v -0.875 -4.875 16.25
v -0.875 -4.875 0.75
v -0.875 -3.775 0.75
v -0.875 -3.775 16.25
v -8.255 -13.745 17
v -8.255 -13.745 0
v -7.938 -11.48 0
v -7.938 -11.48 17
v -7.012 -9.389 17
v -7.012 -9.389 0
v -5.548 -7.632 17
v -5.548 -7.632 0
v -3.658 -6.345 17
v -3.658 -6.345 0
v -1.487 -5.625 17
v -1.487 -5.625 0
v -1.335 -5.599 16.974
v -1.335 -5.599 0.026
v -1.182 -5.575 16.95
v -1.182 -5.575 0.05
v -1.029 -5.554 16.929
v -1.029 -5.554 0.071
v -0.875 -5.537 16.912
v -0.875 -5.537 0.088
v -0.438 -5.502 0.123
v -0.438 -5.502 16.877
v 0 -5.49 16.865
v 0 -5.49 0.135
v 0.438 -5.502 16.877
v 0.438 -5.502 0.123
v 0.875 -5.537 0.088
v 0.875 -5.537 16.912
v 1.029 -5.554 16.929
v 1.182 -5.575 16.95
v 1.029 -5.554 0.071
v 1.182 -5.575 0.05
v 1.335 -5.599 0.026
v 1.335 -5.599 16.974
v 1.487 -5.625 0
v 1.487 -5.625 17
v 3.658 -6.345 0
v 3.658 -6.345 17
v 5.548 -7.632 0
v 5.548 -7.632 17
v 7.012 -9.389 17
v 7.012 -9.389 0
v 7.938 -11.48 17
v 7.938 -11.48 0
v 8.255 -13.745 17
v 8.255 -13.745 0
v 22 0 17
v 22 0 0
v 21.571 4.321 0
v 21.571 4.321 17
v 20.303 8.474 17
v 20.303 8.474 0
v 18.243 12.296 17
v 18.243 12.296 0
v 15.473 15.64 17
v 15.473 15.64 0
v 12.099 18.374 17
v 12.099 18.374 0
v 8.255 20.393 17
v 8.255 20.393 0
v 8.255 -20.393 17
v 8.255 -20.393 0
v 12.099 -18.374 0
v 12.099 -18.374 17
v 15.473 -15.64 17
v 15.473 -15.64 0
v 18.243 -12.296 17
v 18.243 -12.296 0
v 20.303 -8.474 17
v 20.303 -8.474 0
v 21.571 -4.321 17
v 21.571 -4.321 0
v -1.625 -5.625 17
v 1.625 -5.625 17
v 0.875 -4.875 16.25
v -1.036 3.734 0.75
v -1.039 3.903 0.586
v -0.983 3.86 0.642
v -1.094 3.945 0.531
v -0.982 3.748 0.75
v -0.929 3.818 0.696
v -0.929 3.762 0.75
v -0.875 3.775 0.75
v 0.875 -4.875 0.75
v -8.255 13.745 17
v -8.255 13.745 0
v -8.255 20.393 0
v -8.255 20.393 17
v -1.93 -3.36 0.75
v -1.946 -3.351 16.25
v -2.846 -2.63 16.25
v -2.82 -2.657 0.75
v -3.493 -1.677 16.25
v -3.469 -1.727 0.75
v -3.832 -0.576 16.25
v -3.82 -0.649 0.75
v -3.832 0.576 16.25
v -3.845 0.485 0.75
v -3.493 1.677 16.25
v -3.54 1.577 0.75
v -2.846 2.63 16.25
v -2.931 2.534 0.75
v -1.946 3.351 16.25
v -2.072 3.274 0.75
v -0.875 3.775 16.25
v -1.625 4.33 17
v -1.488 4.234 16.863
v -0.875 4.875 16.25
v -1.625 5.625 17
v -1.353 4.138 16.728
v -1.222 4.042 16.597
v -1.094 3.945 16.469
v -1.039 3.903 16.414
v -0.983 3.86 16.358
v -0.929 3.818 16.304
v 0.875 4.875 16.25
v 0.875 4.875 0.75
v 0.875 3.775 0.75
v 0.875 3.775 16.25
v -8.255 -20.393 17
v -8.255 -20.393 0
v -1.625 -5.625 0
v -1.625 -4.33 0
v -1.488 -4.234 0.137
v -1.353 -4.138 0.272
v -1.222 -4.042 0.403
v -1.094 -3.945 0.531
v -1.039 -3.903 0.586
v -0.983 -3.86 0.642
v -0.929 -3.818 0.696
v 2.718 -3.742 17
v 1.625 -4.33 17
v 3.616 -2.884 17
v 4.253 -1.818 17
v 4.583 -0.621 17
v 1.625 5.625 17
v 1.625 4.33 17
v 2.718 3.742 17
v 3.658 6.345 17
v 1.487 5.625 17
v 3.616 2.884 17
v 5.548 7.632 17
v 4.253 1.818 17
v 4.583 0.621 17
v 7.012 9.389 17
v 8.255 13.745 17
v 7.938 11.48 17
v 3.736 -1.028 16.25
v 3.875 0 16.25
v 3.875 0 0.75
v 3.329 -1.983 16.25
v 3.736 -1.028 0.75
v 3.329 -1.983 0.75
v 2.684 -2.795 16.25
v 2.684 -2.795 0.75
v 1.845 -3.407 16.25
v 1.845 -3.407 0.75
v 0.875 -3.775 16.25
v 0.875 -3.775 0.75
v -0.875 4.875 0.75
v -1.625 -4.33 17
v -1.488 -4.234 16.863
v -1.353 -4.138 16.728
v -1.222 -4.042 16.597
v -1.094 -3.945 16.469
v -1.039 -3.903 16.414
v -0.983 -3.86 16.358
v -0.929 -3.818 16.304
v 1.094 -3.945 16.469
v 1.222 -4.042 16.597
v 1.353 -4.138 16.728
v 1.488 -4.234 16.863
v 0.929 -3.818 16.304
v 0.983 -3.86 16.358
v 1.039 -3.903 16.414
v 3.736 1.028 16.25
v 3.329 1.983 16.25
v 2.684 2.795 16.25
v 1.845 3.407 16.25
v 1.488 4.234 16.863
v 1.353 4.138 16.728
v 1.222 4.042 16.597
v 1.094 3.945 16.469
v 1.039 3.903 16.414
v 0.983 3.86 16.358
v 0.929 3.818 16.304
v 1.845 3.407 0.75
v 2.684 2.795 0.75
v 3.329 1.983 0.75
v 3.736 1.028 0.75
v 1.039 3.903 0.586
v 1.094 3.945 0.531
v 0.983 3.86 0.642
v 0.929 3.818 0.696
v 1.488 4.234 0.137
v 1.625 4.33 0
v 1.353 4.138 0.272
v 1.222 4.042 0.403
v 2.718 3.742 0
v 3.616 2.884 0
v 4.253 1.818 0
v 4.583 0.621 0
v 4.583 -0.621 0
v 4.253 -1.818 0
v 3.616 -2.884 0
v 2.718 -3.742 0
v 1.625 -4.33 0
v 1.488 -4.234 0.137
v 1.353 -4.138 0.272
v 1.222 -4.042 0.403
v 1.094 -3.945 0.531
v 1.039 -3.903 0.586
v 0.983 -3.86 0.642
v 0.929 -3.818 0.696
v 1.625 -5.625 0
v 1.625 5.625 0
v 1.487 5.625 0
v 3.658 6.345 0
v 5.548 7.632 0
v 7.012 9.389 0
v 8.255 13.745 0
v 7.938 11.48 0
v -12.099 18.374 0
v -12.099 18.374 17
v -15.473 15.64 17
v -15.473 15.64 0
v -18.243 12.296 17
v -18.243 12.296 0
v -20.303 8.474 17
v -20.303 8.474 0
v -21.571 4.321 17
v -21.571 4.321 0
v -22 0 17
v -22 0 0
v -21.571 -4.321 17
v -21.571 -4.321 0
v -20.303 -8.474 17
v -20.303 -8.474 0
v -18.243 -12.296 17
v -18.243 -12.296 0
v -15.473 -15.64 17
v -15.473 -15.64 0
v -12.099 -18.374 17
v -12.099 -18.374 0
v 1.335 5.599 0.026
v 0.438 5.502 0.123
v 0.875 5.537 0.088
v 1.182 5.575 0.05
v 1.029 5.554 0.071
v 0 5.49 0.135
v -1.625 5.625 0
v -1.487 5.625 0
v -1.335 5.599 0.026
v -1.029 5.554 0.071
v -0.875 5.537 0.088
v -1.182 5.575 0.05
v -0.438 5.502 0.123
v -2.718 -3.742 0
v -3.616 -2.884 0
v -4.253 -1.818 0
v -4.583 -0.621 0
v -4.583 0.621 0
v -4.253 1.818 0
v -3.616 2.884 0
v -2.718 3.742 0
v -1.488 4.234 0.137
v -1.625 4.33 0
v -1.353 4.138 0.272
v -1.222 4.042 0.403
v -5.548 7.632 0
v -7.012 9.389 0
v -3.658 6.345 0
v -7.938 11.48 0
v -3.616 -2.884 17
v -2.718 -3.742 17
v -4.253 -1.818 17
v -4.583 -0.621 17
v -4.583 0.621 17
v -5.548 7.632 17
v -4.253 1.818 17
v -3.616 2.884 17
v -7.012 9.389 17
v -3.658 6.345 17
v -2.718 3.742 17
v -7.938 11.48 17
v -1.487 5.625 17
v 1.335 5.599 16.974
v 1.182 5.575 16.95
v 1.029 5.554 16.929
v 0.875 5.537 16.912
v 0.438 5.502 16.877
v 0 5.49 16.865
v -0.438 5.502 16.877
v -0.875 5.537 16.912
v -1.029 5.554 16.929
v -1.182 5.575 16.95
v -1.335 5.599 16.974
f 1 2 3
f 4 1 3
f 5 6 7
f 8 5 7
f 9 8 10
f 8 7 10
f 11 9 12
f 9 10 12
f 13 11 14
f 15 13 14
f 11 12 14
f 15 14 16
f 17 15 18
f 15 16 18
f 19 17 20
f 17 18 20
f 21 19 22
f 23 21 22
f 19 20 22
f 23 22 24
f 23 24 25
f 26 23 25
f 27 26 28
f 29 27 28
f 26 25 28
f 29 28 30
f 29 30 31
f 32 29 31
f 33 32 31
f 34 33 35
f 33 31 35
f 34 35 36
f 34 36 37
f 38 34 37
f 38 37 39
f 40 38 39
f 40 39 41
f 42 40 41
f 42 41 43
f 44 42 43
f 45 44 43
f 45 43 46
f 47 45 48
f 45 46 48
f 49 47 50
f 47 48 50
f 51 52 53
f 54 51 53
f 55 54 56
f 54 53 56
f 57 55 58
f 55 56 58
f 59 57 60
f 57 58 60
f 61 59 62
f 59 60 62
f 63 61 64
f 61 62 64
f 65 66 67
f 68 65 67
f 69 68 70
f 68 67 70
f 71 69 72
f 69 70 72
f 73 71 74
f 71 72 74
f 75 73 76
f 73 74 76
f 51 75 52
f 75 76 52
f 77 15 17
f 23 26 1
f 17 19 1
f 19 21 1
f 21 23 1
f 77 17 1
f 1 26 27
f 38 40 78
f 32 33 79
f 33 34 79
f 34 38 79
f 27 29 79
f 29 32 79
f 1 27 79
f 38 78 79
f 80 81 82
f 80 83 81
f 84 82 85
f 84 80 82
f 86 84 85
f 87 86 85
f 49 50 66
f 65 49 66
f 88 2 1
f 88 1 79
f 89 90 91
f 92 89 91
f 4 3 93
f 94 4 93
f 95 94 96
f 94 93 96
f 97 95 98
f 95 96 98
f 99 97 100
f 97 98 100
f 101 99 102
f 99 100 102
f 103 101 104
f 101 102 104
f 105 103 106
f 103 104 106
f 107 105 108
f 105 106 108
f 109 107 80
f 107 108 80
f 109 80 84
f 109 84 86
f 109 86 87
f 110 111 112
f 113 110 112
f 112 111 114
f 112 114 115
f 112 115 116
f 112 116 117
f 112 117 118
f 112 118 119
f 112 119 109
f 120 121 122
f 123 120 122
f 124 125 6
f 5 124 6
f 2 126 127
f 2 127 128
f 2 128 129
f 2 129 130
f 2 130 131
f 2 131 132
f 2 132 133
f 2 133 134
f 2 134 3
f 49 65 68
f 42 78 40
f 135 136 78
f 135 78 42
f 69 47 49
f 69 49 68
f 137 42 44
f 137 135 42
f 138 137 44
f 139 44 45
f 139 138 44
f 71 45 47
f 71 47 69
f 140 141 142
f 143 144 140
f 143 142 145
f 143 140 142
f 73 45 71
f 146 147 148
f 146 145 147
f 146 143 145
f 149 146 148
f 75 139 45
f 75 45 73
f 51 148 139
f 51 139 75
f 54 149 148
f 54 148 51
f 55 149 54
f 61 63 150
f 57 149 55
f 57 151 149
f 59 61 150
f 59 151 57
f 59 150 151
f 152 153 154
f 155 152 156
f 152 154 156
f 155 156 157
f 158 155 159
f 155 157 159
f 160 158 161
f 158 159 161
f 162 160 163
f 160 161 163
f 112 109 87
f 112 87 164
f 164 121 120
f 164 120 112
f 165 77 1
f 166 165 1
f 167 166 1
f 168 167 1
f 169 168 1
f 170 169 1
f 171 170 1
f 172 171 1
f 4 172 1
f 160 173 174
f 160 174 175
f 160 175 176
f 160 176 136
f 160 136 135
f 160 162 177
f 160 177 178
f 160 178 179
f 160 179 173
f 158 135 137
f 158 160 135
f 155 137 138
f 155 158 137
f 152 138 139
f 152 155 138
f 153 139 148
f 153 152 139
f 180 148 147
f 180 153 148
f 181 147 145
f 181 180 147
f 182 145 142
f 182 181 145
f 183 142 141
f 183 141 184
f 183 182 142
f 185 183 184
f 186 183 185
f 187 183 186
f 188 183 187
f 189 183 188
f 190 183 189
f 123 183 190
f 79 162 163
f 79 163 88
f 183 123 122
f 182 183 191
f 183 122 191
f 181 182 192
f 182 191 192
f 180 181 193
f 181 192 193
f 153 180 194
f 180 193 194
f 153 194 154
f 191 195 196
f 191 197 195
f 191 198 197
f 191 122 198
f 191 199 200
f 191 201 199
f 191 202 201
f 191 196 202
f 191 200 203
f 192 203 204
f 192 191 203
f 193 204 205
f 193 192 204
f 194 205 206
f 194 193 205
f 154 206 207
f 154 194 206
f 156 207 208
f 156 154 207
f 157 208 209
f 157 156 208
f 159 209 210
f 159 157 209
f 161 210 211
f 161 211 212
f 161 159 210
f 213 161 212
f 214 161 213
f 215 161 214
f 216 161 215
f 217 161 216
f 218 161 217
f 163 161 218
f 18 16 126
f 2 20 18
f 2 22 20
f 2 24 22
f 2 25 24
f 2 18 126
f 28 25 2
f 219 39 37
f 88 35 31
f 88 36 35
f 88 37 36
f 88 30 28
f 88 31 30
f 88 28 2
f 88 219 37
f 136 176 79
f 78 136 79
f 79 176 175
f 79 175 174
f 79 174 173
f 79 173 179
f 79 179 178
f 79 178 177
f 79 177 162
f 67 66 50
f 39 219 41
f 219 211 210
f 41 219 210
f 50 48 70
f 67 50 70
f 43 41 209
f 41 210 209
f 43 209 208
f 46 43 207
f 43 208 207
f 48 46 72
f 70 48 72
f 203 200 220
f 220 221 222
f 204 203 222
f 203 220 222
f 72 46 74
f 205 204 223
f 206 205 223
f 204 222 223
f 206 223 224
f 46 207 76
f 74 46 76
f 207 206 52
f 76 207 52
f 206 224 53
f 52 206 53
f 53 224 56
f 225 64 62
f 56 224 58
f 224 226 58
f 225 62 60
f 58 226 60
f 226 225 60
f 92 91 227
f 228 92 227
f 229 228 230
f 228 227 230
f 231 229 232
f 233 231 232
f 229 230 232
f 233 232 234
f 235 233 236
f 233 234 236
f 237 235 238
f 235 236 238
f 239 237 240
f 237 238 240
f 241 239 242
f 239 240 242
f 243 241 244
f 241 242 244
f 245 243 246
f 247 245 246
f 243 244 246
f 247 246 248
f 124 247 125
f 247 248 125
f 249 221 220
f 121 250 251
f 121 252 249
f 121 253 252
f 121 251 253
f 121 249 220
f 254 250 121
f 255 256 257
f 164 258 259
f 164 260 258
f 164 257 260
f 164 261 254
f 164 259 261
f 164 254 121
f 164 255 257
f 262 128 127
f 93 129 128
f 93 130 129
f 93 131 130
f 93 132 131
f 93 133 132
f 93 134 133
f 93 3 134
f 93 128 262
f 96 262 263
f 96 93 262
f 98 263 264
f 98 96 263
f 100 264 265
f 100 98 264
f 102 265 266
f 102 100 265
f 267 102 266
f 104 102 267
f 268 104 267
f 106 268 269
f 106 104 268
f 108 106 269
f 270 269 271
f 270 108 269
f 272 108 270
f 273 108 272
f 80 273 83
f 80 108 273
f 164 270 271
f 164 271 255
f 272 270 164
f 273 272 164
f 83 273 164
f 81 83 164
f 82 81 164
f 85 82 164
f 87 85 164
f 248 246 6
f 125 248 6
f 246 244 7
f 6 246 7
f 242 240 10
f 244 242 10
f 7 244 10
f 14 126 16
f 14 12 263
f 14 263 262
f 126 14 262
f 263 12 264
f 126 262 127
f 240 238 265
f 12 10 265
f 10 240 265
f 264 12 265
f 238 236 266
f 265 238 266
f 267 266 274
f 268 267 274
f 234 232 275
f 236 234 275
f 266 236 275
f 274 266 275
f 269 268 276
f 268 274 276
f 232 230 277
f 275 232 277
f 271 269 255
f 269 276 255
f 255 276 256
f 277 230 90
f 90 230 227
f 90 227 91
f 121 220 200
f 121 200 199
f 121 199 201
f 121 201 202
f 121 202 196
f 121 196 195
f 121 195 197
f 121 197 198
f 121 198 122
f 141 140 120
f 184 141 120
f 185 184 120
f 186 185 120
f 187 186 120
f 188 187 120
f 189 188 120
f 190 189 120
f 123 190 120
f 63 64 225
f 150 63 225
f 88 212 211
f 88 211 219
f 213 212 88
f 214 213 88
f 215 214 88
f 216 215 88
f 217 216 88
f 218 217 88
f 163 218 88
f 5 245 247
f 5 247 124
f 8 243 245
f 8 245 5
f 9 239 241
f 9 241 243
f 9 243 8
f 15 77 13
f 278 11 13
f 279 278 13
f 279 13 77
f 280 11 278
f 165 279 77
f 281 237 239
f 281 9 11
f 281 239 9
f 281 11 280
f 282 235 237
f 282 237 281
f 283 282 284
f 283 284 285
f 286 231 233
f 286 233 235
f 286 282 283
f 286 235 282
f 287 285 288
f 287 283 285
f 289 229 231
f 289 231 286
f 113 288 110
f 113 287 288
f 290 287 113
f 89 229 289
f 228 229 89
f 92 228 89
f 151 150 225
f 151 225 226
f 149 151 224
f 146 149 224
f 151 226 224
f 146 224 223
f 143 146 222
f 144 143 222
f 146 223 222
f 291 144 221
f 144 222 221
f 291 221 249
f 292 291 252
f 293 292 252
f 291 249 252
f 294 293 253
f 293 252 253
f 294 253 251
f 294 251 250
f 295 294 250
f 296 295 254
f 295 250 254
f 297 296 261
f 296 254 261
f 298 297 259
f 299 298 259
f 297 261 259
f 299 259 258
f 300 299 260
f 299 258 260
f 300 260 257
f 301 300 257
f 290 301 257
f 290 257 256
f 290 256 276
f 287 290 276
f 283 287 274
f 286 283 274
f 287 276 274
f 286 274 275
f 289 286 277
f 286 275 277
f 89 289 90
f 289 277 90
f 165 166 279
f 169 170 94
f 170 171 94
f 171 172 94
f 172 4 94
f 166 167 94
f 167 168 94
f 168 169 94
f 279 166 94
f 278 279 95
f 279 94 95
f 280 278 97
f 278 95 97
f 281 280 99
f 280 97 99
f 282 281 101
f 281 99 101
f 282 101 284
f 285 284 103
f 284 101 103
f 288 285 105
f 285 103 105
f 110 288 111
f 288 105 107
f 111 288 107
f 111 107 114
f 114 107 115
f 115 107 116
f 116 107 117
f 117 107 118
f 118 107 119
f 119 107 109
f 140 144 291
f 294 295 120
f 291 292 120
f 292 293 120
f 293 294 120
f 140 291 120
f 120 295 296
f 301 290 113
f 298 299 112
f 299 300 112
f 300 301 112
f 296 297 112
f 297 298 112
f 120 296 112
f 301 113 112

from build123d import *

# Parameters (mm, degrees)
BOSS_EXTRUDE1_DEPTH = 17
CHAMFER1_SIZE       = 0.75
CHAMFER2_SIZE       = 0.75


with BuildPart() as part:
    # Sketch1 → Boss-Extrude1 (new body)
    # profile 1 of 3: a face of its own
    with BuildSketch(Plane.XY):
        with BuildLine():
            Line((-8.255, 13.745), (-8.255, 20.392522527))
            ThreePointArc((-8.255, 20.392522527), (-22, 0), (-8.255, -20.392522527))
            Line((-8.255, -20.392522527), (-8.255, -13.745000015))
            Line((-8.255, -13.745000015), (-8.255, 13.745))
        make_face()
    # profile 2 of 3: a face of its own
    with BuildSketch(Plane.XY):
        with BuildLine():
            ThreePointArc((22, 0), (18.242943841, 12.296137605), (8.255, 20.392522527))
            Line((8.255, 20.392522527), (8.255, 13.745))
            Line((8.255, 13.745), (8.255, -13.745))
            Line((8.255, -13.745), (8.255, -20.392522527))
            ThreePointArc((8.255, -20.392522527), (18.242943841, -12.296137605), (22, 0))
        make_face()
    # profile 3 of 3: a face of its own
    with BuildSketch(Plane.XY):
        with BuildLine():
            ThreePointArc((8.255, 13.745), (0, 5.49), (-8.255, 13.745))
            Line((-8.255, 13.745), (-8.255, -13.745000015))
            ThreePointArc((-8.255, -13.745000015), (-7e-09, -5.49), (8.255, -13.745))
            Line((8.255, -13.745), (8.255, 13.745))
        make_face()
        with BuildLine():
            Line((-0.875, 3.774917218), (-0.875, 4.875))
            Line((-0.875, 4.875), (0.875, 4.875))
            Line((0.875, 4.875), (0.875, 3.774917218))
            ThreePointArc((0.875, 3.774917218), (3.033665275, 2.41091269), (3.875, 0))
            ThreePointArc((3.875, 0), (3.033665275, -2.41091269), (0.875, -3.774917218))
            Line((0.875, -3.774917218), (0.875, -4.875))
            Line((0.875, -4.875), (-0.875, -4.875))
            Line((-0.875, -4.875), (-0.875, -3.774917218))
            ThreePointArc((-0.875, -3.774917218), (-3.875, 0), (-0.875, 3.774917218))
        make_face(mode=Mode.SUBTRACT)
    extrude(amount=BOSS_EXTRUDE1_DEPTH)

    # Chamfer1
    # the kernel refuses this chamfer: 0.75 mm, written as the material it takes off along each edge
    with BuildSketch(Plane(origin=(-0.875, -4.875, 0), x_dir=(-1, 0, 0), z_dir=(0, 1, 0)), Plane(origin=(0.875, -1.846154977, 0), x_dir=(1, 0, 0), z_dir=(0, -1, 0)), Plane(origin=(0.875, 4.875, 0), x_dir=(1, 0, 0), z_dir=(0, -1, 0)), Plane(origin=(-0.875, 1.846154977, 0), x_dir=(-1, 0, 0), z_dir=(0, 1, 0))) as chamfer1_piece_1:
        Polygon((CHAMFER1_SIZE, 0), (0, CHAMFER1_SIZE), (0, 0), align=None)
    extrude(amount=3.028845023, mode=Mode.SUBTRACT)
    with BuildSketch(Plane(origin=(0.875, -4.875, 0), x_dir=(0, -1, 0), z_dir=(-1, 0, 0)), Plane(origin=(-0.875, 4.875, 0), x_dir=(0, 1, 0), z_dir=(1, 0, 0))) as chamfer1_piece_2:
        Polygon((CHAMFER1_SIZE, 0), (0, CHAMFER1_SIZE), (0, 0), align=None)
    extrude(amount=1.75, mode=Mode.SUBTRACT)
    with BuildSketch(Plane(origin=(0, 0, 0), x_dir=(-0.26727041794230744, 0.9636215666395933, 0), z_dir=(-0.9636215666395933, -0.26727041794230744, 0))) as chamfer1_piece_3:
        Polygon((3.875 + CHAMFER1_SIZE, 0), (3.875, -CHAMFER1_SIZE), (3.875, 0), align=None)
    revolve(axis=Axis((0, 0, 0), (0, 0, -1)), revolution_arc=211.003810324, mode=Mode.SUBTRACT)
    with BuildSketch(Plane(origin=(0, 0, 0), x_dir=(0.2672704179423268, -0.963621566639588, 0), z_dir=(0.963621566639588, 0.2672704179423268, 0))) as chamfer1_piece_4:
        Polygon((3.875 + CHAMFER1_SIZE, 0), (3.875, -CHAMFER1_SIZE), (3.875, 0), align=None)
    revolve(axis=Axis((0, 0, 0), (0, 0, -1)), revolution_arc=211.003810324, mode=Mode.SUBTRACT)
    with BuildSketch(Plane(origin=(0.875, -4.875, 0), x_dir=(0, -1, 0), z_dir=(-1, 0, 0))) as chamfer1_piece_5a_section:
        Polygon((CHAMFER1_SIZE, 0), (0, CHAMFER1_SIZE), (0, 0), align=None)
    chamfer1_piece_5a = extrude(amount=3.678762241, mode=Mode.PRIVATE)
    chamfer1_piece_5a = chamfer1_piece_5a - Plane(origin=(0, -13.745, 0), x_dir=(-1.0, -1.8151489867665974e-09, 0), z_dir=(0, 0, -1)) * Cylinder(8.255, 11, mode=Mode.PRIVATE)
    chamfer1_piece_5a = split(chamfer1_piece_5a, bisect_by=Plane(origin=(-0.875, -4.875, 0), z_dir=(-1, 0, 0)), keep=Keep.TOP, mode=Mode.PRIVATE)
    with BuildSketch(Plane(origin=(-0.875, -6.803762241, 0), x_dir=(-1, 0, 0), z_dir=(0, 1, 0))) as chamfer1_piece_5b_section:
        Polygon((CHAMFER1_SIZE, 0), (0, CHAMFER1_SIZE), (0, 0), align=None)
    chamfer1_piece_5b = extrude(amount=4.957607264, mode=Mode.PRIVATE)
    chamfer1_piece_5b = chamfer1_piece_5b - Plane(origin=(0, -13.745, 0), x_dir=(-1.0, -1.8151489867665974e-09, 0), z_dir=(0, 0, -1)) * Cylinder(8.255, 13, mode=Mode.PRIVATE)
    chamfer1_piece_5b = split(chamfer1_piece_5b, bisect_by=Plane(origin=(-0.875, -4.875, 0), z_dir=(0, -1, 0)), keep=Keep.TOP, mode=Mode.PRIVATE)
    chamfer1_piece_5 = chamfer1_piece_5a & chamfer1_piece_5b
    add(chamfer1_piece_5, mode=Mode.SUBTRACT)
    with BuildSketch(Plane(origin=(0.875, -1.846154977, 0), x_dir=(1, 0, 0), z_dir=(0, -1, 0))) as chamfer1_piece_6a_section:
        Polygon((CHAMFER1_SIZE, 0), (0, CHAMFER1_SIZE), (0, 0), align=None)
    chamfer1_piece_6a = extrude(amount=4.957607264, mode=Mode.PRIVATE)
    chamfer1_piece_6a = chamfer1_piece_6a - Plane(origin=(0, -13.745, 0), x_dir=(-1.0, -1.8151489867665974e-09, 0), z_dir=(0, 0, -1)) * Cylinder(8.255, 13, mode=Mode.PRIVATE)
    chamfer1_piece_6a = split(chamfer1_piece_6a, bisect_by=Plane(origin=(0.875, -4.875, 0), z_dir=(0, -1, 0)), keep=Keep.TOP, mode=Mode.PRIVATE)
    with BuildSketch(Plane(origin=(2.803762241, -4.875, 0), x_dir=(0, -1, 0), z_dir=(-1, 0, 0))) as chamfer1_piece_6b_section:
        Polygon((CHAMFER1_SIZE, 0), (0, CHAMFER1_SIZE), (0, 0), align=None)
    chamfer1_piece_6b = extrude(amount=3.678762241, mode=Mode.PRIVATE)
    chamfer1_piece_6b = chamfer1_piece_6b - Plane(origin=(0, -13.745, 0), x_dir=(-1.0, -1.8151489867665974e-09, 0), z_dir=(0, 0, -1)) * Cylinder(8.255, 11, mode=Mode.PRIVATE)
    chamfer1_piece_6b = split(chamfer1_piece_6b, bisect_by=Plane(origin=(0.875, -4.875, 0), z_dir=(1, 0, 0)), keep=Keep.TOP, mode=Mode.PRIVATE)
    chamfer1_piece_6 = chamfer1_piece_6a & chamfer1_piece_6b
    add(chamfer1_piece_6, mode=Mode.SUBTRACT)
    with BuildSketch(Plane(origin=(-0.875, 4.875, 0), x_dir=(0, 1, 0), z_dir=(1, 0, 0))) as chamfer1_piece_7a_section:
        Polygon((CHAMFER1_SIZE, 0), (0, CHAMFER1_SIZE), (0, 0), align=None)
    chamfer1_piece_7a = extrude(amount=3.678762241, mode=Mode.PRIVATE)
    chamfer1_piece_7a = chamfer1_piece_7a - Plane(origin=(0, 13.745, 0), x_dir=(1, 0, 0), z_dir=(0, 0, -1)) * Cylinder(8.255, 11, mode=Mode.PRIVATE)
    chamfer1_piece_7a = split(chamfer1_piece_7a, bisect_by=Plane(origin=(0.875, 4.875, 0), z_dir=(1, 0, 0)), keep=Keep.TOP, mode=Mode.PRIVATE)
    with BuildSketch(Plane(origin=(0.875, 6.803762241, 0), x_dir=(1, 0, 0), z_dir=(0, -1, 0))) as chamfer1_piece_7b_section:
        Polygon((CHAMFER1_SIZE, 0), (0, CHAMFER1_SIZE), (0, 0), align=None)
    chamfer1_piece_7b = extrude(amount=4.957607264, mode=Mode.PRIVATE)
    chamfer1_piece_7b = chamfer1_piece_7b - Plane(origin=(0, 13.745, 0), x_dir=(1, 0, 0), z_dir=(0, 0, -1)) * Cylinder(8.255, 13, mode=Mode.PRIVATE)
    chamfer1_piece_7b = split(chamfer1_piece_7b, bisect_by=Plane(origin=(0.875, 4.875, 0), z_dir=(0, 1, 0)), keep=Keep.TOP, mode=Mode.PRIVATE)
    chamfer1_piece_7 = chamfer1_piece_7a & chamfer1_piece_7b
    add(chamfer1_piece_7, mode=Mode.SUBTRACT)
    with BuildSketch(Plane(origin=(-0.875, 1.846154977, 0), x_dir=(-1, 0, 0), z_dir=(0, 1, 0))) as chamfer1_piece_8a_section:
        Polygon((CHAMFER1_SIZE, 0), (0, CHAMFER1_SIZE), (0, 0), align=None)
    chamfer1_piece_8a = extrude(amount=4.957607264, mode=Mode.PRIVATE)
    chamfer1_piece_8a = chamfer1_piece_8a - Plane(origin=(0, 13.745, 0), x_dir=(1, 0, 0), z_dir=(0, 0, -1)) * Cylinder(8.255, 13, mode=Mode.PRIVATE)
    chamfer1_piece_8a = split(chamfer1_piece_8a, bisect_by=Plane(origin=(-0.875, 4.875, 0), z_dir=(0, 1, 0)), keep=Keep.TOP, mode=Mode.PRIVATE)
    with BuildSketch(Plane(origin=(-2.803762241, 4.875, 0), x_dir=(0, 1, 0), z_dir=(1, 0, 0))) as chamfer1_piece_8b_section:
        Polygon((CHAMFER1_SIZE, 0), (0, CHAMFER1_SIZE), (0, 0), align=None)
    chamfer1_piece_8b = extrude(amount=3.678762241, mode=Mode.PRIVATE)
    chamfer1_piece_8b = chamfer1_piece_8b - Plane(origin=(0, 13.745, 0), x_dir=(1, 0, 0), z_dir=(0, 0, -1)) * Cylinder(8.255, 11, mode=Mode.PRIVATE)
    chamfer1_piece_8b = split(chamfer1_piece_8b, bisect_by=Plane(origin=(-0.875, 4.875, 0), z_dir=(-1, 0, 0)), keep=Keep.TOP, mode=Mode.PRIVATE)
    chamfer1_piece_8 = chamfer1_piece_8a & chamfer1_piece_8b
    add(chamfer1_piece_8, mode=Mode.SUBTRACT)

    # Chamfer2
    # the kernel refuses this chamfer: 0.75 mm, written as the material it takes off along each edge
    with BuildSketch(Plane(origin=(0, 0, 17), x_dir=(0.2672704179423268, -0.963621566639588, 0), z_dir=(0.963621566639588, 0.2672704179423268, 0))) as chamfer2_piece_1:
        Polygon((3.875 + CHAMFER2_SIZE, 0), (3.875, CHAMFER2_SIZE), (3.875, 0), align=None)
    revolve(axis=Axis((0, 0, 17), (0, 0, -1)), revolution_arc=211.003810324, mode=Mode.SUBTRACT)
    with BuildSketch(Plane(origin=(-0.875, 1.846154977, 17), x_dir=(-1, 0, 0), z_dir=(0, 1, 0)), Plane(origin=(0.875, 4.875, 17), x_dir=(1, 0, 0), z_dir=(0, -1, 0)), Plane(origin=(0.875, -1.846154977, 17), x_dir=(1, 0, 0), z_dir=(0, -1, 0)), Plane(origin=(-0.875, -4.875, 17), x_dir=(-1, 0, 0), z_dir=(0, 1, 0))) as chamfer2_piece_2:
        Polygon((CHAMFER2_SIZE, 0), (0, -CHAMFER2_SIZE), (0, 0), align=None)
    extrude(amount=3.028845023, mode=Mode.SUBTRACT)
    with BuildSketch(Plane(origin=(-0.875, 4.875, 17), x_dir=(0, 1, 0), z_dir=(1, 0, 0)), Plane(origin=(0.875, -4.875, 17), x_dir=(0, -1, 0), z_dir=(-1, 0, 0))) as chamfer2_piece_3:
        Polygon((CHAMFER2_SIZE, 0), (0, -CHAMFER2_SIZE), (0, 0), align=None)
    extrude(amount=1.75, mode=Mode.SUBTRACT)
    with BuildSketch(Plane(origin=(0, 0, 17), x_dir=(-0.26727041794230755, -0.9636215666395933, 0), z_dir=(-0.9636215666395933, 0.26727041794230755, 0))) as chamfer2_piece_4:
        Polygon((3.875 + CHAMFER2_SIZE, 0), (3.875, -CHAMFER2_SIZE), (3.875, 0), align=None)
    revolve(axis=Axis((0, 0, 17), (0, 0, 1)), revolution_arc=211.003810324, mode=Mode.SUBTRACT)
    with BuildSketch(Plane(origin=(-0.875, 1.846154977, 17), x_dir=(-1, 0, 0), z_dir=(0, 1, 0))) as chamfer2_piece_5a_section:
        Polygon((CHAMFER2_SIZE, 0), (0, -CHAMFER2_SIZE), (0, 0), align=None)
    chamfer2_piece_5a = extrude(amount=4.957607264, mode=Mode.PRIVATE)
    chamfer2_piece_5a = split(chamfer2_piece_5a, bisect_by=Plane(origin=(-0.875, 4.875, 17), z_dir=(0, 1, 0)), keep=Keep.TOP, mode=Mode.PRIVATE)
    chamfer2_piece_5a = chamfer2_piece_5a - Plane(origin=(0, 13.745, 17), x_dir=(1, 0, 0), z_dir=(0, 0, -1)) * Cylinder(8.255, 13, mode=Mode.PRIVATE)
    with BuildSketch(Plane(origin=(-2.803762241, 4.875, 17), x_dir=(0, 1, 0), z_dir=(1, 0, 0))) as chamfer2_piece_5b_section:
        Polygon((CHAMFER2_SIZE, 0), (0, -CHAMFER2_SIZE), (0, 0), align=None)
    chamfer2_piece_5b = extrude(amount=3.678762241, mode=Mode.PRIVATE)
    chamfer2_piece_5b = split(chamfer2_piece_5b, bisect_by=Plane(origin=(-0.875, 4.875, 17), z_dir=(-1, 0, 0)), keep=Keep.TOP, mode=Mode.PRIVATE)
    chamfer2_piece_5b = chamfer2_piece_5b - Plane(origin=(0, 13.745, 17), x_dir=(1, 0, 0), z_dir=(0, 0, -1)) * Cylinder(8.255, 11, mode=Mode.PRIVATE)
    chamfer2_piece_5 = chamfer2_piece_5a & chamfer2_piece_5b
    add(chamfer2_piece_5, mode=Mode.SUBTRACT)
    with BuildSketch(Plane(origin=(-0.875, 4.875, 17), x_dir=(0, 1, 0), z_dir=(1, 0, 0))) as chamfer2_piece_6a_section:
        Polygon((CHAMFER2_SIZE, 0), (0, -CHAMFER2_SIZE), (0, 0), align=None)
    chamfer2_piece_6a = extrude(amount=3.678762241, mode=Mode.PRIVATE)
    chamfer2_piece_6a = split(chamfer2_piece_6a, bisect_by=Plane(origin=(0.875, 4.875, 17), z_dir=(1, 0, 0)), keep=Keep.TOP, mode=Mode.PRIVATE)
    chamfer2_piece_6a = chamfer2_piece_6a - Plane(origin=(0, 13.745, 17), x_dir=(1, 0, 0), z_dir=(0, 0, -1)) * Cylinder(8.255, 11, mode=Mode.PRIVATE)
    with BuildSketch(Plane(origin=(0.875, 6.803762241, 17), x_dir=(1, 0, 0), z_dir=(0, -1, 0))) as chamfer2_piece_6b_section:
        Polygon((CHAMFER2_SIZE, 0), (0, -CHAMFER2_SIZE), (0, 0), align=None)
    chamfer2_piece_6b = extrude(amount=4.957607264, mode=Mode.PRIVATE)
    chamfer2_piece_6b = split(chamfer2_piece_6b, bisect_by=Plane(origin=(0.875, 4.875, 17), z_dir=(0, 1, 0)), keep=Keep.TOP, mode=Mode.PRIVATE)
    chamfer2_piece_6b = chamfer2_piece_6b - Plane(origin=(0, 13.745, 17), x_dir=(1, 0, 0), z_dir=(0, 0, -1)) * Cylinder(8.255, 13, mode=Mode.PRIVATE)
    chamfer2_piece_6 = chamfer2_piece_6a & chamfer2_piece_6b
    add(chamfer2_piece_6, mode=Mode.SUBTRACT)
    with BuildSketch(Plane(origin=(0.875, -1.846154977, 17), x_dir=(1, 0, 0), z_dir=(0, -1, 0))) as chamfer2_piece_7a_section:
        Polygon((CHAMFER2_SIZE, 0), (0, -CHAMFER2_SIZE), (0, 0), align=None)
    chamfer2_piece_7a = extrude(amount=4.957607264, mode=Mode.PRIVATE)
    chamfer2_piece_7a = split(chamfer2_piece_7a, bisect_by=Plane(origin=(0.875, -4.875, 17), z_dir=(0, -1, 0)), keep=Keep.TOP, mode=Mode.PRIVATE)
    chamfer2_piece_7a = chamfer2_piece_7a - Plane(origin=(0, -13.745, 17), x_dir=(-1.0, -1.8151489867665974e-09, 0), z_dir=(0, 0, -1)) * Cylinder(8.255, 13, mode=Mode.PRIVATE)
    with BuildSketch(Plane(origin=(2.803762241, -4.875, 17), x_dir=(0, -1, 0), z_dir=(-1, 0, 0))) as chamfer2_piece_7b_section:
        Polygon((CHAMFER2_SIZE, 0), (0, -CHAMFER2_SIZE), (0, 0), align=None)
    chamfer2_piece_7b = extrude(amount=3.678762241, mode=Mode.PRIVATE)
    chamfer2_piece_7b = split(chamfer2_piece_7b, bisect_by=Plane(origin=(0.875, -4.875, 17), z_dir=(1, 0, 0)), keep=Keep.TOP, mode=Mode.PRIVATE)
    chamfer2_piece_7b = chamfer2_piece_7b - Plane(origin=(0, -13.745, 17), x_dir=(-1.0, -1.8151489867665974e-09, 0), z_dir=(0, 0, -1)) * Cylinder(8.255, 11, mode=Mode.PRIVATE)
    chamfer2_piece_7 = chamfer2_piece_7a & chamfer2_piece_7b
    add(chamfer2_piece_7, mode=Mode.SUBTRACT)
    with BuildSketch(Plane(origin=(0.875, -4.875, 17), x_dir=(0, -1, 0), z_dir=(-1, 0, 0))) as chamfer2_piece_8a_section:
        Polygon((CHAMFER2_SIZE, 0), (0, -CHAMFER2_SIZE), (0, 0), align=None)
    chamfer2_piece_8a = extrude(amount=3.678762241, mode=Mode.PRIVATE)
    chamfer2_piece_8a = split(chamfer2_piece_8a, bisect_by=Plane(origin=(-0.875, -4.875, 17), z_dir=(-1, 0, 0)), keep=Keep.TOP, mode=Mode.PRIVATE)
    chamfer2_piece_8a = chamfer2_piece_8a - Plane(origin=(0, -13.745, 17), x_dir=(-1.0, -1.8151489867665974e-09, 0), z_dir=(0, 0, -1)) * Cylinder(8.255, 11, mode=Mode.PRIVATE)
    with BuildSketch(Plane(origin=(-0.875, -6.803762241, 17), x_dir=(-1, 0, 0), z_dir=(0, 1, 0))) as chamfer2_piece_8b_section:
        Polygon((CHAMFER2_SIZE, 0), (0, -CHAMFER2_SIZE), (0, 0), align=None)
    chamfer2_piece_8b = extrude(amount=4.957607264, mode=Mode.PRIVATE)
    chamfer2_piece_8b = split(chamfer2_piece_8b, bisect_by=Plane(origin=(-0.875, -4.875, 17), z_dir=(0, -1, 0)), keep=Keep.TOP, mode=Mode.PRIVATE)
    chamfer2_piece_8b = chamfer2_piece_8b - Plane(origin=(0, -13.745, 17), x_dir=(-1.0, -1.8151489867665974e-09, 0), z_dir=(0, 0, -1)) * Cylinder(8.255, 13, mode=Mode.PRIVATE)
    chamfer2_piece_8 = chamfer2_piece_8a & chamfer2_piece_8b
    add(chamfer2_piece_8, mode=Mode.SUBTRACT)


solid = part.part
